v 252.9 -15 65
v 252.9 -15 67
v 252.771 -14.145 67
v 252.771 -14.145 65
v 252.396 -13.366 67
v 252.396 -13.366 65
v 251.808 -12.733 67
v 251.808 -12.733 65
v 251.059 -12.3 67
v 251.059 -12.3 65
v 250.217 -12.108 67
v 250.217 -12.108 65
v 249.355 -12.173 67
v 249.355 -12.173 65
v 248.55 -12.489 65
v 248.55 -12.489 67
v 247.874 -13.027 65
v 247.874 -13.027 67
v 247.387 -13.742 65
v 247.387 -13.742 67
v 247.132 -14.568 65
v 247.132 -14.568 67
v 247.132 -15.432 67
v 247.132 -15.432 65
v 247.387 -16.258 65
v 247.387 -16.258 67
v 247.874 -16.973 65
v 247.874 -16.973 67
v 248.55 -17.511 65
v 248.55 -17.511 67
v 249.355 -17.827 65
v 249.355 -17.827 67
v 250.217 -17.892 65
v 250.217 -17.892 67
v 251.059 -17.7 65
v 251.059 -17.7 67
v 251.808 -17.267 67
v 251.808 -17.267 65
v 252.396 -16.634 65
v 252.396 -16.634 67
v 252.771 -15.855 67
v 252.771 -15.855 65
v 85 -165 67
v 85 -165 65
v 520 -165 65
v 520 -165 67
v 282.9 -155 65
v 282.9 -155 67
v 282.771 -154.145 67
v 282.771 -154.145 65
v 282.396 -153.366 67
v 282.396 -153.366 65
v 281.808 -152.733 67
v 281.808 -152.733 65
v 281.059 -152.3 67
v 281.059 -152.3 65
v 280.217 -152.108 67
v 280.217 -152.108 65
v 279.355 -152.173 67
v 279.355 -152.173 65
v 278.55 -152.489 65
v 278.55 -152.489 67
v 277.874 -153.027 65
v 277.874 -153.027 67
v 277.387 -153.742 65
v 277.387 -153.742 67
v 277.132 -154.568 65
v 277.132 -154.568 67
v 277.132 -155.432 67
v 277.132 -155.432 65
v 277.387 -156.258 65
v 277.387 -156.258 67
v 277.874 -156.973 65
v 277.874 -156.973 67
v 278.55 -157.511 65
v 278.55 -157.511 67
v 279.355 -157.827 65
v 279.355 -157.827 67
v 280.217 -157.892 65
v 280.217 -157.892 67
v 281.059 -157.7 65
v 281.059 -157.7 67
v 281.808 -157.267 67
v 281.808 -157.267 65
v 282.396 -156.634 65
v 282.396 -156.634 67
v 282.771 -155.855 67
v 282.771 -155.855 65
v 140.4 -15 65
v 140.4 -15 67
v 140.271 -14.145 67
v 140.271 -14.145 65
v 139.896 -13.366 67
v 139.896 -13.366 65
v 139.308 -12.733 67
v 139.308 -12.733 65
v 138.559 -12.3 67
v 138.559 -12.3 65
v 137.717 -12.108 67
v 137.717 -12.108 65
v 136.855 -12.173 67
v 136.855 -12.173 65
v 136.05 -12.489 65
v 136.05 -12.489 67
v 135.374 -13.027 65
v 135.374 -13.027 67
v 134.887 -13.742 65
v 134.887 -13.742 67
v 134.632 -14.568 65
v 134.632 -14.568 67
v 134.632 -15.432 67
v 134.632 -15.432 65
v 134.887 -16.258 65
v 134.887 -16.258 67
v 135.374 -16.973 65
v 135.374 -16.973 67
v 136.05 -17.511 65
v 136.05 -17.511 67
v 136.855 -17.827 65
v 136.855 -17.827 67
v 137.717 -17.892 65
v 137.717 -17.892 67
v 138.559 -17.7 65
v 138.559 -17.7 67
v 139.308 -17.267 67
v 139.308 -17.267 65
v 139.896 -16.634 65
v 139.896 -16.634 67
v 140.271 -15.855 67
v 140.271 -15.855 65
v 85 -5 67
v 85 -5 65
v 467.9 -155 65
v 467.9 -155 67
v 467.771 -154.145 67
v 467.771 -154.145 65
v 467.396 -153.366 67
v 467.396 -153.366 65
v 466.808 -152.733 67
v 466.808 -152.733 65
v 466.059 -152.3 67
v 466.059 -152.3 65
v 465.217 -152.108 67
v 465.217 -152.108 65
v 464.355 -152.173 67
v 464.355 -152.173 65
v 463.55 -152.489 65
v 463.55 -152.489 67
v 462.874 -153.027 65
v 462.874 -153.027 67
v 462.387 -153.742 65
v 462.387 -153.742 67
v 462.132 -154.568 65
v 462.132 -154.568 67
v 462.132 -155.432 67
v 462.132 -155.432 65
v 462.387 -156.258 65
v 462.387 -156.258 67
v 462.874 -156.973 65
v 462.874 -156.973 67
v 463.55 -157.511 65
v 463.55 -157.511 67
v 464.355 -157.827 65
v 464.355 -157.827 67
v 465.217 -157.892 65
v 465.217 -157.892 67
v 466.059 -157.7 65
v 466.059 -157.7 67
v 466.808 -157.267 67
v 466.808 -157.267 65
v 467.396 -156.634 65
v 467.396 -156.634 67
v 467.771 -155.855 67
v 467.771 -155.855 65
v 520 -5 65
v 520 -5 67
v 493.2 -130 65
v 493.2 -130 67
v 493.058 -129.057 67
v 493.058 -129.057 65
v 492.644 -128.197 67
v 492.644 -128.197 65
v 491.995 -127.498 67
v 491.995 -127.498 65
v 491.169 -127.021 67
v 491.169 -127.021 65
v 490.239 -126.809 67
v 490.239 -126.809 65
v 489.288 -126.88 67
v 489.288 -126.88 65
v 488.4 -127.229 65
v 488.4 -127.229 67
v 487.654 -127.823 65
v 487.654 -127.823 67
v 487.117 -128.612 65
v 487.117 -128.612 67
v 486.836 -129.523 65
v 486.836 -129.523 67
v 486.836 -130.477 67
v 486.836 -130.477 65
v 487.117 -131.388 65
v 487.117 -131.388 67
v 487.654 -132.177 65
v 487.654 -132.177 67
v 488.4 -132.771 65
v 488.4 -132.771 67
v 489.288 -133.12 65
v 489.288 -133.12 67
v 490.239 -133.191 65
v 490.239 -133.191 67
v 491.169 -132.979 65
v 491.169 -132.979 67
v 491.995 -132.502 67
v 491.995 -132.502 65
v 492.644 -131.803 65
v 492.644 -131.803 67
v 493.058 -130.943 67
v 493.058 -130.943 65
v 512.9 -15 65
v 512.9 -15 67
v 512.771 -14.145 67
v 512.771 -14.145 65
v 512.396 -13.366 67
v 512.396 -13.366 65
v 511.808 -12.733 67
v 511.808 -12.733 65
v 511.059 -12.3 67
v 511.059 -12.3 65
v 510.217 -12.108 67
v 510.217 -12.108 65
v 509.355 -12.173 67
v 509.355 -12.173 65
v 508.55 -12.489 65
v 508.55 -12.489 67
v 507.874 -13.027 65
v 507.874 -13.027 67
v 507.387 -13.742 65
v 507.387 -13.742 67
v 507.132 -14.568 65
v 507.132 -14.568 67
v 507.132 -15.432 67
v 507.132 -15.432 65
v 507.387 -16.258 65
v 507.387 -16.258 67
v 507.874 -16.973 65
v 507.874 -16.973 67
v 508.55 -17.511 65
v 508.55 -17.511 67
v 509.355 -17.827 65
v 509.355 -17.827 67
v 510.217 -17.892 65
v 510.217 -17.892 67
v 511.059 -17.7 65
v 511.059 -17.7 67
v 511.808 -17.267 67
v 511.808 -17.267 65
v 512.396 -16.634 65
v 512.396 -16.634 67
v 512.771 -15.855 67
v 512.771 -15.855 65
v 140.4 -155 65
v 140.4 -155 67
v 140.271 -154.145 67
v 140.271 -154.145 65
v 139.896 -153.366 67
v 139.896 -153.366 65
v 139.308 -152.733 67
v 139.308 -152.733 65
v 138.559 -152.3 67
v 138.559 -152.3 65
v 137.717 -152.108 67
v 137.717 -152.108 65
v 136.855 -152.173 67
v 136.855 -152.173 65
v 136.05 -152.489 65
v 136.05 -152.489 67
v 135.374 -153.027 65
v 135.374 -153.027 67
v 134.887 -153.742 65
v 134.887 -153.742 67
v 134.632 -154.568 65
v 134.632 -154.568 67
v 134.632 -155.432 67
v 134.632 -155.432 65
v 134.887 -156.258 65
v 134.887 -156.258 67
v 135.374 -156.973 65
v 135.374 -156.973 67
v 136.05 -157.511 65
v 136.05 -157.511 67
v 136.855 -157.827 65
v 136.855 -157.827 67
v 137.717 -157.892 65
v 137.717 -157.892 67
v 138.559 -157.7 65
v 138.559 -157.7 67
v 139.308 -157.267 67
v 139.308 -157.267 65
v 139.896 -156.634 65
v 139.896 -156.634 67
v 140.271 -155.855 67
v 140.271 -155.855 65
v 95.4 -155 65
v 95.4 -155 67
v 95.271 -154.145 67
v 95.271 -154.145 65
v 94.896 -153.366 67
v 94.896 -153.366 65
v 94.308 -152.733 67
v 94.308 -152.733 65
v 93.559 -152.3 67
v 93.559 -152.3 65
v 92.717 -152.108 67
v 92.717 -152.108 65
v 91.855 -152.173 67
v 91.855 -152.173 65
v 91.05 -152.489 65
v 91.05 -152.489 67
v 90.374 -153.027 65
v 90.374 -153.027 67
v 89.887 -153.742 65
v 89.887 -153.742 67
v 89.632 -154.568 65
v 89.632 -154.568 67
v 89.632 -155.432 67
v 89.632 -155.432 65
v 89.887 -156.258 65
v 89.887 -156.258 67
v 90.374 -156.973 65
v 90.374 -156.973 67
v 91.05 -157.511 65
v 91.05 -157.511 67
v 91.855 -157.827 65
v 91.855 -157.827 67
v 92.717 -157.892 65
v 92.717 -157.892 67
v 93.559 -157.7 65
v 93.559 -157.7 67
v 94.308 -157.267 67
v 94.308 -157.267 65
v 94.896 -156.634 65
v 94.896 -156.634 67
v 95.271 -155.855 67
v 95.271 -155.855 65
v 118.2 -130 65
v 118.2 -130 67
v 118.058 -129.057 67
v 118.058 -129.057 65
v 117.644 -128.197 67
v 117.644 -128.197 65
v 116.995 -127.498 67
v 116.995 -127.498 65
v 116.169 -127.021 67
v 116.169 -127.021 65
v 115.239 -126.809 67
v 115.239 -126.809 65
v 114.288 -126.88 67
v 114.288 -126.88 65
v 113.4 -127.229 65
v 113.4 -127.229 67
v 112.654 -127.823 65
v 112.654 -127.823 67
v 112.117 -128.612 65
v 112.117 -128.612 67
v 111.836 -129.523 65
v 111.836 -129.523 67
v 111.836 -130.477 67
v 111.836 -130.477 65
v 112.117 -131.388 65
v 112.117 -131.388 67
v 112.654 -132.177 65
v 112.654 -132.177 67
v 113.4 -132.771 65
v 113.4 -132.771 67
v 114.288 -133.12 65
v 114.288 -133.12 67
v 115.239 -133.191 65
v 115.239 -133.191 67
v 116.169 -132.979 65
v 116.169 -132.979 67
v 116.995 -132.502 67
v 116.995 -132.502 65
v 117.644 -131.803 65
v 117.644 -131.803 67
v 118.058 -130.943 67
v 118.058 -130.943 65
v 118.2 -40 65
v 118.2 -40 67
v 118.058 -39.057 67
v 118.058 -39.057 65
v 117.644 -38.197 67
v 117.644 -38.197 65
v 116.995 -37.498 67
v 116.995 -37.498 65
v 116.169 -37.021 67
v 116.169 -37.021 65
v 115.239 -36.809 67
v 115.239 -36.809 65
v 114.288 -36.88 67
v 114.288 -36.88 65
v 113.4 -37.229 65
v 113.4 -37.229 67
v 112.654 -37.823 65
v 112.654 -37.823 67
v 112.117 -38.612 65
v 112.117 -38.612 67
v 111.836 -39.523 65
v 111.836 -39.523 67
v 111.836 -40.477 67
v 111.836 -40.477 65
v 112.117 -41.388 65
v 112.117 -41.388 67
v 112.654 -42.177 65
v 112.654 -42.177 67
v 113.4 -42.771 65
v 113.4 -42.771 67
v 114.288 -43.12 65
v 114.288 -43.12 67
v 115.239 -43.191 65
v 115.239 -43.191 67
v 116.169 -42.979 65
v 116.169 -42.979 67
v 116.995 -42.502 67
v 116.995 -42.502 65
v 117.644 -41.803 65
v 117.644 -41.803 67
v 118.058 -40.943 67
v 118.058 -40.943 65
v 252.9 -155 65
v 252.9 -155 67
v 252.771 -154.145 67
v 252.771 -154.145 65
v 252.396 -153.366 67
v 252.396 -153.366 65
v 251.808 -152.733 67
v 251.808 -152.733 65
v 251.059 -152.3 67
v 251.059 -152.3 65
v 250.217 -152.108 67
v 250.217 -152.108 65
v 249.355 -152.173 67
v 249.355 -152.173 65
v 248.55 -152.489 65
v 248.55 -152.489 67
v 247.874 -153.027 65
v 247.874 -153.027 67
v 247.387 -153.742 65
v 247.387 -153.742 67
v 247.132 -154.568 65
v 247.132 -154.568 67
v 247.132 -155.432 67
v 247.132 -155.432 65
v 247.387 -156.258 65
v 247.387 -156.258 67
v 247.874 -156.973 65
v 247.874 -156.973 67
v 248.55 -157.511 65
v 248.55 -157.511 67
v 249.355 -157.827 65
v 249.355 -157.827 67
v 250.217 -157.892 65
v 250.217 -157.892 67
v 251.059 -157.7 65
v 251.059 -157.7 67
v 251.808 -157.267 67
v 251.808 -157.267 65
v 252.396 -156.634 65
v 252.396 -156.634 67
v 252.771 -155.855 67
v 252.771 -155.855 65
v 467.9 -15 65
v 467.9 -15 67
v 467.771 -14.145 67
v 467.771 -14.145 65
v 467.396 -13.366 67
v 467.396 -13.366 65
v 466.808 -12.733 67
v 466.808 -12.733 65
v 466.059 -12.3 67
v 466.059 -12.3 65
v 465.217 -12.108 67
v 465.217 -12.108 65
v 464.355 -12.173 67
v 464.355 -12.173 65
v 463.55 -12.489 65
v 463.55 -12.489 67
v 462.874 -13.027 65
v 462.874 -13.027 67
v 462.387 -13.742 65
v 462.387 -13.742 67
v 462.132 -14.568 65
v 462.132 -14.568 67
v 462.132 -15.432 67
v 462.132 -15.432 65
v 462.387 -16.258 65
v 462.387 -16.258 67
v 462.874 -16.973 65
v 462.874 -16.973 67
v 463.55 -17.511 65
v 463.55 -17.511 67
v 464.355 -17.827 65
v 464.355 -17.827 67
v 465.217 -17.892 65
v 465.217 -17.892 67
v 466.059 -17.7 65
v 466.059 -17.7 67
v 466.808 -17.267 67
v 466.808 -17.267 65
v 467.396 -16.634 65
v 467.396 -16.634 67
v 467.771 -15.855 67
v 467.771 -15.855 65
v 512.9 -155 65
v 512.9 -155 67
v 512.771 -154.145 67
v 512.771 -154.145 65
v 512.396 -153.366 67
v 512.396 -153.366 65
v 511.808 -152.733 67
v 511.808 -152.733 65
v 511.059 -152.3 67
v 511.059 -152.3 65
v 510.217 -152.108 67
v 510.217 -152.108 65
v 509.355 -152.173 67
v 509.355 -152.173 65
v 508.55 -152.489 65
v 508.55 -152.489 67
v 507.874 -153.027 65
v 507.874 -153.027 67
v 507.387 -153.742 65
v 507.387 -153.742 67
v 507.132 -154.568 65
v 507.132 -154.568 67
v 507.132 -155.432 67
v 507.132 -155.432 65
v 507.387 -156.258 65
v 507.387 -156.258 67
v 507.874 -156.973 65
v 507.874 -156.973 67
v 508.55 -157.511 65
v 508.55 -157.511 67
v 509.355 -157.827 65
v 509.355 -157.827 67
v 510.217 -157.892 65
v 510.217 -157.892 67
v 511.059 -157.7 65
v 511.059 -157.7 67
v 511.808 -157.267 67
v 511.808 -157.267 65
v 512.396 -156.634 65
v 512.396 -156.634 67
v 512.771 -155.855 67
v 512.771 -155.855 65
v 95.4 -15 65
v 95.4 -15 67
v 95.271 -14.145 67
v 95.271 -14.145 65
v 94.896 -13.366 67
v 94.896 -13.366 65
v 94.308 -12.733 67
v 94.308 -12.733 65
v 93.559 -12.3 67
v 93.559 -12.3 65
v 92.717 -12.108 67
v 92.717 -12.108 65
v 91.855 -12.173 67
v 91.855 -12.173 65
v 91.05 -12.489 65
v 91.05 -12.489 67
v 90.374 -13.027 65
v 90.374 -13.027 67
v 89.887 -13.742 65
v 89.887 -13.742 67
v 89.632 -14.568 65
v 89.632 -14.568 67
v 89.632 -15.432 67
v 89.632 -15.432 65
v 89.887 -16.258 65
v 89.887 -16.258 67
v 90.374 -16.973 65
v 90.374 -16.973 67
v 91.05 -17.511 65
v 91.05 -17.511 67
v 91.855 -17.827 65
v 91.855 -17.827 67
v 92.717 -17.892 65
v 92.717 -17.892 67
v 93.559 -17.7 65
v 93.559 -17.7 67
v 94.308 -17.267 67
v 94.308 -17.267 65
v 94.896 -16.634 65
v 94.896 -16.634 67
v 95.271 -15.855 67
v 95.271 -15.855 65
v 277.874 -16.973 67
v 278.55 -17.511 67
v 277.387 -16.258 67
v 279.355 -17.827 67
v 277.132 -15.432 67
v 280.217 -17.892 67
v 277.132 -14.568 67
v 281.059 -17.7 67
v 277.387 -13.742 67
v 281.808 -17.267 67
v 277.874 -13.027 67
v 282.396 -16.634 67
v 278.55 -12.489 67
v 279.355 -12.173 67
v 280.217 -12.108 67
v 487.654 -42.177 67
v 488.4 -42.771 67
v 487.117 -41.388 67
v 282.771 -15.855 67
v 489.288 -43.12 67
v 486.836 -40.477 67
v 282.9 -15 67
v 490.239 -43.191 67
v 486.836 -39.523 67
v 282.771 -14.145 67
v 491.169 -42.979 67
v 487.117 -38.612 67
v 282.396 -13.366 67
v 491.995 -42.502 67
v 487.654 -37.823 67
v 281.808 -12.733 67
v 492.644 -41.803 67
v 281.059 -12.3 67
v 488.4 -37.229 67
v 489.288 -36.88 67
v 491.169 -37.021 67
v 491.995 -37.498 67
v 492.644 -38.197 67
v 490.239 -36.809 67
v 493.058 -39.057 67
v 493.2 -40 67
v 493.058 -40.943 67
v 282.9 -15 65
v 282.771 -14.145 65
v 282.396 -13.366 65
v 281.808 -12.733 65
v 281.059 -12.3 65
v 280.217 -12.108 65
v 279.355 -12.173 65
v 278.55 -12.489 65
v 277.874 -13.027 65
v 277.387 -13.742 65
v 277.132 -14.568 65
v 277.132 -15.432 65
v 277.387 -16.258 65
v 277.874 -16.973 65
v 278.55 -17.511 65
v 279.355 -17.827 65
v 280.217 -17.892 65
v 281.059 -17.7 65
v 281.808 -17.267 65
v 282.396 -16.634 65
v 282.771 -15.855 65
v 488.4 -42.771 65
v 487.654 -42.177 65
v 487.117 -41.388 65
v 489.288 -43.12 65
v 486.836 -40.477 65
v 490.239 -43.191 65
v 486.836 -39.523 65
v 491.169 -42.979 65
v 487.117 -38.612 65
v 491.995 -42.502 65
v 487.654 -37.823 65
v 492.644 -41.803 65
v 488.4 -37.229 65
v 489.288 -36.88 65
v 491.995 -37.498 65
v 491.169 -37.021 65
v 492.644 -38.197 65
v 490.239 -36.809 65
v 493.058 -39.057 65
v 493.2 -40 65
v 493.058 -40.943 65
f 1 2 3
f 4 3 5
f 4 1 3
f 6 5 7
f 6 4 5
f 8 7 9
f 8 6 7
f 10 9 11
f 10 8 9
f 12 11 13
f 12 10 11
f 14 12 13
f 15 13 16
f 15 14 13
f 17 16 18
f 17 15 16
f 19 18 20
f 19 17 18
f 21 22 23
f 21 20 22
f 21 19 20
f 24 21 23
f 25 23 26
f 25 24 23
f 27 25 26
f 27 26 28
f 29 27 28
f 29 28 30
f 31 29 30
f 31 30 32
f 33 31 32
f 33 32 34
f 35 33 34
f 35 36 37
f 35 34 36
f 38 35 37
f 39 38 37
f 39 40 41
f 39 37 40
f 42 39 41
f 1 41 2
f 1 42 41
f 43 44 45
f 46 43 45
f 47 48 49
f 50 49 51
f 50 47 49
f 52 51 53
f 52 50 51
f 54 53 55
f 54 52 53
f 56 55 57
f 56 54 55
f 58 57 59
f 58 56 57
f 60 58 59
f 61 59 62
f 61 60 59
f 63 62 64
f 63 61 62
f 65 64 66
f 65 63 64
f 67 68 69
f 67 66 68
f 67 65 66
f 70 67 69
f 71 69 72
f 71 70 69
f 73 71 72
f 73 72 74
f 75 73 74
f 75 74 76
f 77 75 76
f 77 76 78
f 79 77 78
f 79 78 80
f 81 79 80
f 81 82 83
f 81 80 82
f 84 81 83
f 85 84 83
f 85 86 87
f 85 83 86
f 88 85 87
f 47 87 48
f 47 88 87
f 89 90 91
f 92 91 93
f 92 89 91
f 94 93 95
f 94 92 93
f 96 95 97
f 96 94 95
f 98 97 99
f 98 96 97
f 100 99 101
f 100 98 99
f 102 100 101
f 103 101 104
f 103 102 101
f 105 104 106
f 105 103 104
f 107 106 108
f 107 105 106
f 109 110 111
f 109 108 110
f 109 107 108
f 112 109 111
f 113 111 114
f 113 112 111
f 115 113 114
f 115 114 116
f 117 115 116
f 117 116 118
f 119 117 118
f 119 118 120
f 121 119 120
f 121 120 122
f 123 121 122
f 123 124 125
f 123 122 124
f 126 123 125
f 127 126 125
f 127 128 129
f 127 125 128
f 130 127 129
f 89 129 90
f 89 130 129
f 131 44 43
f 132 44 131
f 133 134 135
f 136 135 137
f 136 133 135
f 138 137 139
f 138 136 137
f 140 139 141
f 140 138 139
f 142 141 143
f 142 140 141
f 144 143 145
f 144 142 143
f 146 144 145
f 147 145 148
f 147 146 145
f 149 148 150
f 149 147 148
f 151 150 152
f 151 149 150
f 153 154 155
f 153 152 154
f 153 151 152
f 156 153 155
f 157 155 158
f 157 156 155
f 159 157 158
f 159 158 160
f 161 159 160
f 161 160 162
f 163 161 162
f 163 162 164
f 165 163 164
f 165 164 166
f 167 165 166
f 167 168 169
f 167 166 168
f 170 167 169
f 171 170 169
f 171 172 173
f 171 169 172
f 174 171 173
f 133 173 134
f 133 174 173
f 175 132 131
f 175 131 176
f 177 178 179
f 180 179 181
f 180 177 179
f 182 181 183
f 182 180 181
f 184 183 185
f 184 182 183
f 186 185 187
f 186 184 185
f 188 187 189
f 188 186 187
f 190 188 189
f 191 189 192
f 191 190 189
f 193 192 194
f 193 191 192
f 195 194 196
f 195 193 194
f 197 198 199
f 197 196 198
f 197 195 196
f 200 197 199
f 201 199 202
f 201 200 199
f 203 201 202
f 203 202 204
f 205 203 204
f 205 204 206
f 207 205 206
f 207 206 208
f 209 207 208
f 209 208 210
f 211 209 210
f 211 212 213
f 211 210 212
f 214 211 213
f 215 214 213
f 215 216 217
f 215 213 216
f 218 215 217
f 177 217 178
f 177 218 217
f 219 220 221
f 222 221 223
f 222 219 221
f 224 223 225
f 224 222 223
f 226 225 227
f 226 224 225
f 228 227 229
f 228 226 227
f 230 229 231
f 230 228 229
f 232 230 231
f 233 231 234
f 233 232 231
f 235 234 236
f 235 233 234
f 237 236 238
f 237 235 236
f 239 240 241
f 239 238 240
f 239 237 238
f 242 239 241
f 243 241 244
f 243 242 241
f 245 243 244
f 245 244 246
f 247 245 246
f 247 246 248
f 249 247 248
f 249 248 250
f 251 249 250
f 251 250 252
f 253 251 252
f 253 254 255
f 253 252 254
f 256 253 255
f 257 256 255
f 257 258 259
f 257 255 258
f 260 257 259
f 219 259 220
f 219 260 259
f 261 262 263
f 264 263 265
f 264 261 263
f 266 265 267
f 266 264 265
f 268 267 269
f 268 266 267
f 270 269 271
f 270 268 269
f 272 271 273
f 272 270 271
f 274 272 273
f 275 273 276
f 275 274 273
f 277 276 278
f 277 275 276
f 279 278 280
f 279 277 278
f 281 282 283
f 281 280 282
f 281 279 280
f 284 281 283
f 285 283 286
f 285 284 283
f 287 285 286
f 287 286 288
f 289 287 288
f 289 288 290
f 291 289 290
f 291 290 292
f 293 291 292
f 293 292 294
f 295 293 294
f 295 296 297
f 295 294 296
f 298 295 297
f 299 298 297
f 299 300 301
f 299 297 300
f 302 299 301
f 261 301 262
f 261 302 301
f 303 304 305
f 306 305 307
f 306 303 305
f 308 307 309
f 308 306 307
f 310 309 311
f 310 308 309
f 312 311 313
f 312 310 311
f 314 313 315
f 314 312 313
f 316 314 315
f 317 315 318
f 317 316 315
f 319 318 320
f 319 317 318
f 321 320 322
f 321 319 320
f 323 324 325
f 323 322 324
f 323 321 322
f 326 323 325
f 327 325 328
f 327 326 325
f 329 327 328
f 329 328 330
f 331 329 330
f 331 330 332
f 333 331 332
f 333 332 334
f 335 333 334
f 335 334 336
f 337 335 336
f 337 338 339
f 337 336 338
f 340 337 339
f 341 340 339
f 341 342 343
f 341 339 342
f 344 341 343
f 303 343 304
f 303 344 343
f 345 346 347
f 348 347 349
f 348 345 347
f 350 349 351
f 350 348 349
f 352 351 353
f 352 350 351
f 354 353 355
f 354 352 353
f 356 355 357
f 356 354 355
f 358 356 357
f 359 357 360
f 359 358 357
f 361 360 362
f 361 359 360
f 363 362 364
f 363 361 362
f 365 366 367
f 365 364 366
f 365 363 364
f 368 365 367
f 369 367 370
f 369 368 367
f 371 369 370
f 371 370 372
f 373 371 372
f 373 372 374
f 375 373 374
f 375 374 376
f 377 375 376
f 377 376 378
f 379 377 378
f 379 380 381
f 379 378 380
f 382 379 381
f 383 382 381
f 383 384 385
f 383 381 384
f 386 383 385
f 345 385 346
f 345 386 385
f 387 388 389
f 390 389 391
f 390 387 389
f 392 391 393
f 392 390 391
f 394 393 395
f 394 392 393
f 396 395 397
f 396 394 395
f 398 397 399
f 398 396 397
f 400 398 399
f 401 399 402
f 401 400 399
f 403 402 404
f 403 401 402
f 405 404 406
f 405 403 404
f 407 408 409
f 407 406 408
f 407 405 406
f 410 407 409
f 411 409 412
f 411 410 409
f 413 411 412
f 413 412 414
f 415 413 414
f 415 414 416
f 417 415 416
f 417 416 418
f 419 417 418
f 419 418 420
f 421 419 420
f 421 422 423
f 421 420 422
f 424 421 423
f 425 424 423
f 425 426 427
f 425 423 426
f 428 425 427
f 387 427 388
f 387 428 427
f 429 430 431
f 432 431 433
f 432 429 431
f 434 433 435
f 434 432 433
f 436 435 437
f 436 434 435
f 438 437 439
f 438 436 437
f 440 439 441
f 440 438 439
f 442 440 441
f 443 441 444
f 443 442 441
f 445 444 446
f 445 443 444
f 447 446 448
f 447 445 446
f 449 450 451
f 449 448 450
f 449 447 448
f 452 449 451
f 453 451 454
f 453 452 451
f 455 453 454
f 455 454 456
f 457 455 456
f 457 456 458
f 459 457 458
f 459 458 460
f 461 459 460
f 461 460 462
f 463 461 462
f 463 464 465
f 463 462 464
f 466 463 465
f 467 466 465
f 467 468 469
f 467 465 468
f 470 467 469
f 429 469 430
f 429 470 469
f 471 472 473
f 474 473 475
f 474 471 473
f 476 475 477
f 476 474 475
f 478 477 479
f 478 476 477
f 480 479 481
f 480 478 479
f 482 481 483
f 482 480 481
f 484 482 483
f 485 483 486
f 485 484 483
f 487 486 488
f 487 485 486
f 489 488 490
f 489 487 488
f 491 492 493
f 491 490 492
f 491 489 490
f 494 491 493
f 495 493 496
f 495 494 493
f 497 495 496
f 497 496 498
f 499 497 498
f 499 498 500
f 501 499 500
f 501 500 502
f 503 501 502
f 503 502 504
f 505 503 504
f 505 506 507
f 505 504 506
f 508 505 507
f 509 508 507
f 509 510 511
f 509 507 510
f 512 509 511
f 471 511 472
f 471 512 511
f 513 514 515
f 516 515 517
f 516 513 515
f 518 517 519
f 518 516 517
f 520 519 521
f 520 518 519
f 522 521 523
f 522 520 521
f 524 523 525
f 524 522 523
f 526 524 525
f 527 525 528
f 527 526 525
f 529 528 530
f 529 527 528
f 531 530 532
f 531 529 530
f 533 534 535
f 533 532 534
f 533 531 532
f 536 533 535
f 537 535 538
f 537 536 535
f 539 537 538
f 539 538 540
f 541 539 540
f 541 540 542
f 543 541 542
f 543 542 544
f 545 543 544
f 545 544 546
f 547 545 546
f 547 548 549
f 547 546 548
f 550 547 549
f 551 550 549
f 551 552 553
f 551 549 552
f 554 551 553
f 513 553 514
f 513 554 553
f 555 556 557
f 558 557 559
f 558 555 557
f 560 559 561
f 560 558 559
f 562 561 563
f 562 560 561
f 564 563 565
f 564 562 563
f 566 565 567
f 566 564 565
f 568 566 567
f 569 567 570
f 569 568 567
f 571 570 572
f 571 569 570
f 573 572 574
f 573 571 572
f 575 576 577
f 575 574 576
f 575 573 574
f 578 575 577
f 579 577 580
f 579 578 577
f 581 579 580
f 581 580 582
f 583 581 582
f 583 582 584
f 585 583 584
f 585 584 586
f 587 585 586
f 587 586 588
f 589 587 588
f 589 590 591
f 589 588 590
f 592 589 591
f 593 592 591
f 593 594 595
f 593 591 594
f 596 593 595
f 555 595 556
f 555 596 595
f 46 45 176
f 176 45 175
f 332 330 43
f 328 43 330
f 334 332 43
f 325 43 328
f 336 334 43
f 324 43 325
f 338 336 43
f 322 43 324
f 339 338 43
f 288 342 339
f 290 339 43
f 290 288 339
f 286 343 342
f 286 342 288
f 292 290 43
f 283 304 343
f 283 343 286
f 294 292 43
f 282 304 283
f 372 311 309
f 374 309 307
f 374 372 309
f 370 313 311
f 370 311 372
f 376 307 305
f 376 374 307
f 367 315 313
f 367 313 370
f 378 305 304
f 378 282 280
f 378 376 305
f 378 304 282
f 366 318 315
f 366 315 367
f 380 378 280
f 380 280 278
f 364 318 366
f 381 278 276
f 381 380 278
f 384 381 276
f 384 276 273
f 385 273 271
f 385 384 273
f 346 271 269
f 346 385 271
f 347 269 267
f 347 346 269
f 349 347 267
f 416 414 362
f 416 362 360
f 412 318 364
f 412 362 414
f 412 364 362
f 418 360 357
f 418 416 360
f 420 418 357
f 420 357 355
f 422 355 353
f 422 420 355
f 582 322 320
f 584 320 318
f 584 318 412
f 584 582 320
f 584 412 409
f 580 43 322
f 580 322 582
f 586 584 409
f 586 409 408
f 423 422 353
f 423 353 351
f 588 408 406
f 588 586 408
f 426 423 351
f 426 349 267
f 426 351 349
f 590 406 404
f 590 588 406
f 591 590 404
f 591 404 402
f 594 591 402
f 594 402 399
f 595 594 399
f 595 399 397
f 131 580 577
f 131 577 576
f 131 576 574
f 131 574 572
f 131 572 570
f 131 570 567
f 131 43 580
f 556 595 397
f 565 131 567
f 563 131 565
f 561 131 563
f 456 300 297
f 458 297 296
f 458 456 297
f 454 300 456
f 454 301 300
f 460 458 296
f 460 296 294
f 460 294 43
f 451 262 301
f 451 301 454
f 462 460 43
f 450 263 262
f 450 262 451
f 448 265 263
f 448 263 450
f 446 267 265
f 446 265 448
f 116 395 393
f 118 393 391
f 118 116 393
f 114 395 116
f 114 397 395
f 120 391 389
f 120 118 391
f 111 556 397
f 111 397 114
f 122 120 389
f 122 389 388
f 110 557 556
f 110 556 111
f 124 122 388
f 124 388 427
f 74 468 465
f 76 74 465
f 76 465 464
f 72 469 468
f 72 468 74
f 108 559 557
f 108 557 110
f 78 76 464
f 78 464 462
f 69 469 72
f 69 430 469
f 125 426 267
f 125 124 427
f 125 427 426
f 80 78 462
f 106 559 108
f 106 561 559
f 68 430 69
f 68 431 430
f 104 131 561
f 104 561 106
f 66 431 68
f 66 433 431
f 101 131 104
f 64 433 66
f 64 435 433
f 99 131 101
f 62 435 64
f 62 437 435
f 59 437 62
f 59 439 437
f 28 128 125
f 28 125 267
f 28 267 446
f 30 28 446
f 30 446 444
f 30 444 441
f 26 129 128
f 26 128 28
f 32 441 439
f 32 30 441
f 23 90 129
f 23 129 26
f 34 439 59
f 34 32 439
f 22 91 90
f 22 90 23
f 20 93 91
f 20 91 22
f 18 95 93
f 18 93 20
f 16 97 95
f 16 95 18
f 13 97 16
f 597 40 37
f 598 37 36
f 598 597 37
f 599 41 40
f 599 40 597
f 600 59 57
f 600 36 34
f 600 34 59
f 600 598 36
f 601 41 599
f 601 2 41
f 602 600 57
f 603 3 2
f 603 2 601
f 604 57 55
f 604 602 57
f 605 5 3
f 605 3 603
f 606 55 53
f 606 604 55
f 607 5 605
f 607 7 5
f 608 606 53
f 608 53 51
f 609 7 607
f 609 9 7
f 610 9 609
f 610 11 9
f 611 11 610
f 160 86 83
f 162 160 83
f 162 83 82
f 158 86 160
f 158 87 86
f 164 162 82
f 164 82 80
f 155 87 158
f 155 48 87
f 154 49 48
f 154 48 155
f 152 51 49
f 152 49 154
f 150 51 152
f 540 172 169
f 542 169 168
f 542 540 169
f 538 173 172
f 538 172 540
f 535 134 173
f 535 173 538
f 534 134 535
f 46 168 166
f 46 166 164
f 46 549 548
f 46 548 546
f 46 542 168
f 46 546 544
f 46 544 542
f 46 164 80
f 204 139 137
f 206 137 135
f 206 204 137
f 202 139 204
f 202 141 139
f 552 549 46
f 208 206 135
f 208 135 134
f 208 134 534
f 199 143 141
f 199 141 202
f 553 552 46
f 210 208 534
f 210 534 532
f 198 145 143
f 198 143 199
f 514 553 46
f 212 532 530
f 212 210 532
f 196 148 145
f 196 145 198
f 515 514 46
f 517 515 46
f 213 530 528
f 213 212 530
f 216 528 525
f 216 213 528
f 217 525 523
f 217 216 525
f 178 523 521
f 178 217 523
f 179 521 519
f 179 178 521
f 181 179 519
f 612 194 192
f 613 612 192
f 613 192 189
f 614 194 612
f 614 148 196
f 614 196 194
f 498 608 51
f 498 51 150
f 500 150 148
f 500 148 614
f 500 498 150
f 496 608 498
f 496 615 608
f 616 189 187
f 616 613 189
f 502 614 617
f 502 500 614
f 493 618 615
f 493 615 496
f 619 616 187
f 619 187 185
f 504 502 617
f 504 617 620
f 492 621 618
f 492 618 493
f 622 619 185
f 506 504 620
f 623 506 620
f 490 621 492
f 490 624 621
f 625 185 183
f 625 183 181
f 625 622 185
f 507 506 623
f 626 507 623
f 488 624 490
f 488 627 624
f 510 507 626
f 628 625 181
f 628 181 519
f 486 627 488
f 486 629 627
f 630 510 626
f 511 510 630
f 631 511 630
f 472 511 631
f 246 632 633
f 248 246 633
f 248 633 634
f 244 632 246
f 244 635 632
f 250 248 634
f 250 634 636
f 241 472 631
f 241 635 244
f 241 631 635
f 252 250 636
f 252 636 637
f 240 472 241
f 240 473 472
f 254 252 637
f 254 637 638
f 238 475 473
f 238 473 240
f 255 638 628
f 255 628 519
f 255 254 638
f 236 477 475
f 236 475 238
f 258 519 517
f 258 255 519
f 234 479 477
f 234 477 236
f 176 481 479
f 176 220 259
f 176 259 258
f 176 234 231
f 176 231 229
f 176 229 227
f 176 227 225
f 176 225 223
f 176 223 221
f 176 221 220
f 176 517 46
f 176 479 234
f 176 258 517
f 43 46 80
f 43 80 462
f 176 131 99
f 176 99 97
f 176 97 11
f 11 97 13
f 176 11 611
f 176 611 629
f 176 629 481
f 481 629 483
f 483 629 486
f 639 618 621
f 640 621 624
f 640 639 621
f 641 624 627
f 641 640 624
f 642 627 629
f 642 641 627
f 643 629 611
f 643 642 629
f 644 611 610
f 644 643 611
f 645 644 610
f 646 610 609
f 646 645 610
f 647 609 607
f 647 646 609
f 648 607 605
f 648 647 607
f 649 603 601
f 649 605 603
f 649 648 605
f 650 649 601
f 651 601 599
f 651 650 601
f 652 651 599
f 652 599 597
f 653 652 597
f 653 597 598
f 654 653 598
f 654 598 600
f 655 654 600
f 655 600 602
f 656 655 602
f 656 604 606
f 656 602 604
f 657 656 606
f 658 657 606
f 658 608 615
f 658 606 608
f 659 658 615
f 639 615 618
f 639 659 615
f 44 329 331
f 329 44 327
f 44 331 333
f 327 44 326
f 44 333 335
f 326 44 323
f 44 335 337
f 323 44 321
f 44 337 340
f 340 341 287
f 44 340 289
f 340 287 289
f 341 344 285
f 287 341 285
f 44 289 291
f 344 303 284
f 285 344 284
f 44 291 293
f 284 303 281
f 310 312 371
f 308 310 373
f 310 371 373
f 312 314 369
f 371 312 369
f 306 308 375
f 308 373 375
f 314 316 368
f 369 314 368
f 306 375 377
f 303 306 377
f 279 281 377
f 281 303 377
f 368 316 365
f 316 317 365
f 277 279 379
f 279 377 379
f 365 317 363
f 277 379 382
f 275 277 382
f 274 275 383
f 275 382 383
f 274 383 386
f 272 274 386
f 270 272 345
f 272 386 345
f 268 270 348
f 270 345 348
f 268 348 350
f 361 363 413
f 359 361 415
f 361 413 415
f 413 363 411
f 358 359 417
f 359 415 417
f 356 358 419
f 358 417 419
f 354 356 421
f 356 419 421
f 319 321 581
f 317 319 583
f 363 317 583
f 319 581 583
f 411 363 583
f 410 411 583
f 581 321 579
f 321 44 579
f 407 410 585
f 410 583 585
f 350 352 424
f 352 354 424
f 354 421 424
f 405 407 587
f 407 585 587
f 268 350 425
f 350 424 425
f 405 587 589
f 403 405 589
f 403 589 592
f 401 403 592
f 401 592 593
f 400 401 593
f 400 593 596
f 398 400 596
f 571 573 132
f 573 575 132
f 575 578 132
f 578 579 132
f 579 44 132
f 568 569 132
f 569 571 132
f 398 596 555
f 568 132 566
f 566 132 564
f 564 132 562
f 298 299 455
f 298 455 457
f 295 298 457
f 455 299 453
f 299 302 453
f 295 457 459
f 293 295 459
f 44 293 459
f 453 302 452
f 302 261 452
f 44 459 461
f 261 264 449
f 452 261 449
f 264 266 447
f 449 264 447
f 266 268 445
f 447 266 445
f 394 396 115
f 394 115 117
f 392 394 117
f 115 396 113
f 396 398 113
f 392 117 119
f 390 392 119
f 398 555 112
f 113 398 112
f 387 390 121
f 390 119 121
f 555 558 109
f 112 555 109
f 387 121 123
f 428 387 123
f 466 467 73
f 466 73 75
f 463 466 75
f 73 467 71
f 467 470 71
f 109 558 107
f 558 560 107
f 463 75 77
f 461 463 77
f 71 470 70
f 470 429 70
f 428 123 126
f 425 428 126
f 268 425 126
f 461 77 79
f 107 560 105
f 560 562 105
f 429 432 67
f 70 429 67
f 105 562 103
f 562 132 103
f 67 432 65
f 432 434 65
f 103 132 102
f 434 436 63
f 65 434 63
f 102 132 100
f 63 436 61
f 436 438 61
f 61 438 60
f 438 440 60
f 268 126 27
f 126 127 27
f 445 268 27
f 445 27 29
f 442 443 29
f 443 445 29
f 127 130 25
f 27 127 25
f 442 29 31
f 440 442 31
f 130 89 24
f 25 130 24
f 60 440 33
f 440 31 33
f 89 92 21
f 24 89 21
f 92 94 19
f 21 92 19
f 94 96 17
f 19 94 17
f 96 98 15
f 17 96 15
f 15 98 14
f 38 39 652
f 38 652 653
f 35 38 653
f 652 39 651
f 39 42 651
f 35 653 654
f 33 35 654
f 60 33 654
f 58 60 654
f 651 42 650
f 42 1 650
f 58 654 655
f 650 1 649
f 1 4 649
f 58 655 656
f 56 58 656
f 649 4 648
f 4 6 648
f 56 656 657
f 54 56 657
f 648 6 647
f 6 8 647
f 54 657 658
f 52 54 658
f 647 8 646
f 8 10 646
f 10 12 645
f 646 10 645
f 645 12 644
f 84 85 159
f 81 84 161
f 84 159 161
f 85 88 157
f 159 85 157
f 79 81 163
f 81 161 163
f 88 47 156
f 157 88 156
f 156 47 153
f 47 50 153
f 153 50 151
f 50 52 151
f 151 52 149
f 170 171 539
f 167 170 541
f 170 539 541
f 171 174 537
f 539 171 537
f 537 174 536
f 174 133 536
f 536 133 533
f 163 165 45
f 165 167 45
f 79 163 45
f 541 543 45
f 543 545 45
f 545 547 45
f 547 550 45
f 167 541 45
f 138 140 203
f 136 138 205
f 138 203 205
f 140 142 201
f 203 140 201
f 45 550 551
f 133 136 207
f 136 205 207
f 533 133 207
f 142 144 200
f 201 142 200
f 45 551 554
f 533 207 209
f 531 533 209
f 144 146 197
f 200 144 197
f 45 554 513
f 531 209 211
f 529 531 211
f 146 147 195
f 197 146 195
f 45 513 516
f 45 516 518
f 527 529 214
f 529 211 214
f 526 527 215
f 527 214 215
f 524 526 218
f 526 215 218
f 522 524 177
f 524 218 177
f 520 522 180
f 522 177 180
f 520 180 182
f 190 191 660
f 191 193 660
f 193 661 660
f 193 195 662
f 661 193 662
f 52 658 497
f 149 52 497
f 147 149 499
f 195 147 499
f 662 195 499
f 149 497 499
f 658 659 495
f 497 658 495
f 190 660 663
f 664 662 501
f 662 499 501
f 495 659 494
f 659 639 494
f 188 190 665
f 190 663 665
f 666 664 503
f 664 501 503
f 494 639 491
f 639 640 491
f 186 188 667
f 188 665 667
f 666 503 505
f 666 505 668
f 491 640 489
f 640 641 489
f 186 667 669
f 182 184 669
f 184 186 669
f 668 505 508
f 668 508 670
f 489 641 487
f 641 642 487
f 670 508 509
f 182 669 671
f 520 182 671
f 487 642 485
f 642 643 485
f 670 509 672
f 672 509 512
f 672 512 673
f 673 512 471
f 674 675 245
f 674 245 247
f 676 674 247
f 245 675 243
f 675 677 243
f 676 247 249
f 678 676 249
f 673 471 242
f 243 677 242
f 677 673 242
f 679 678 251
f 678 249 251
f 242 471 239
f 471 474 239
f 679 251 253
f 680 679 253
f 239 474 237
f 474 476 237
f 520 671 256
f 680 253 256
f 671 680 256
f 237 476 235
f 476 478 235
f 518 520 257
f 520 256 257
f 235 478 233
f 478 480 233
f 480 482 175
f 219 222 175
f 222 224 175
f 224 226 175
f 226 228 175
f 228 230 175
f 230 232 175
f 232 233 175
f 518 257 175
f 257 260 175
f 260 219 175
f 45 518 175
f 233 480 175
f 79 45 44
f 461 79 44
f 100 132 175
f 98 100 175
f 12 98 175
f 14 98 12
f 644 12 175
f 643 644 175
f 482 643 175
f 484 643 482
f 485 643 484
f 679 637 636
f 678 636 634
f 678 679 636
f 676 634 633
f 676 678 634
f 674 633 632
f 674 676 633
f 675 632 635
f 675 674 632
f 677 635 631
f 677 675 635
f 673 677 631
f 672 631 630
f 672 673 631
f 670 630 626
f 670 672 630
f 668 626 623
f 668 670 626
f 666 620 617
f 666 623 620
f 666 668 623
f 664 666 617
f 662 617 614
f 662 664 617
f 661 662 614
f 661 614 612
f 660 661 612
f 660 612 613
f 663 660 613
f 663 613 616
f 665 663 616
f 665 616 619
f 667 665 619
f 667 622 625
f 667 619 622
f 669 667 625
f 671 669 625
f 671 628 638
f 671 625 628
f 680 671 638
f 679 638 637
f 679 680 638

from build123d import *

# Parameters (mm, degrees)
SKETCH040_W   = 435
SKETCH040_H   = 160
PAD014_DEPTH  = 2
SKETCH041_R   = 2.9
HOLE014_DEPTH = 25
SKETCH042_R   = 3.2
HOLE015_DEPTH = 25


with BuildPart() as part:
    # Sketch040 → Pad014 (new body)
    with BuildSketch(Plane.XY):
        with Locations((302.5, -85)):
            Rectangle(SKETCH040_W, SKETCH040_H)
    extrude(amount=PAD014_DEPTH)

    # Sketch041 → Hole014 (cut)
    with BuildSketch(Plane.XY):
        with Locations((92.5, -15)):
            Circle(SKETCH041_R)
        with Locations((250, -15)):
            Circle(SKETCH041_R)
        with Locations((280, -15)):
            Circle(SKETCH041_R)
        with Locations((280, -155)):
            Circle(SKETCH041_R)
        with Locations((250, -155)):
            Circle(SKETCH041_R)
        with Locations((92.5, -155)):
            Circle(SKETCH041_R)
        with Locations((510, -15)):
            Circle(SKETCH041_R)
        with Locations((510, -155)):
            Circle(SKETCH041_R)
        with Locations((137.5, -15)):
            Circle(SKETCH041_R)
        with Locations((137.5, -155)):
            Circle(SKETCH041_R)
        with Locations((465, -15)):
            Circle(SKETCH041_R)
        with Locations((465, -155)):
            Circle(SKETCH041_R)
    extrude(amount=HOLE014_DEPTH, mode=Mode.SUBTRACT)

    # Sketch042 → Hole015 (cut)
    with BuildSketch(Plane.XY):
        with Locations((490, -40)):
            Circle(SKETCH042_R)
        with Locations((490, -130)):
            Circle(SKETCH042_R)
        with Locations((115, -40)):
            Circle(SKETCH042_R)
        with Locations((115, -130)):
            Circle(SKETCH042_R)
    extrude(amount=HOLE015_DEPTH, mode=Mode.SUBTRACT)


with BuildPart() as part_1:
    # Body006 placement: moved
    add(part.part.moved(Location((0, 0, 65))))


solid = part_1.part
